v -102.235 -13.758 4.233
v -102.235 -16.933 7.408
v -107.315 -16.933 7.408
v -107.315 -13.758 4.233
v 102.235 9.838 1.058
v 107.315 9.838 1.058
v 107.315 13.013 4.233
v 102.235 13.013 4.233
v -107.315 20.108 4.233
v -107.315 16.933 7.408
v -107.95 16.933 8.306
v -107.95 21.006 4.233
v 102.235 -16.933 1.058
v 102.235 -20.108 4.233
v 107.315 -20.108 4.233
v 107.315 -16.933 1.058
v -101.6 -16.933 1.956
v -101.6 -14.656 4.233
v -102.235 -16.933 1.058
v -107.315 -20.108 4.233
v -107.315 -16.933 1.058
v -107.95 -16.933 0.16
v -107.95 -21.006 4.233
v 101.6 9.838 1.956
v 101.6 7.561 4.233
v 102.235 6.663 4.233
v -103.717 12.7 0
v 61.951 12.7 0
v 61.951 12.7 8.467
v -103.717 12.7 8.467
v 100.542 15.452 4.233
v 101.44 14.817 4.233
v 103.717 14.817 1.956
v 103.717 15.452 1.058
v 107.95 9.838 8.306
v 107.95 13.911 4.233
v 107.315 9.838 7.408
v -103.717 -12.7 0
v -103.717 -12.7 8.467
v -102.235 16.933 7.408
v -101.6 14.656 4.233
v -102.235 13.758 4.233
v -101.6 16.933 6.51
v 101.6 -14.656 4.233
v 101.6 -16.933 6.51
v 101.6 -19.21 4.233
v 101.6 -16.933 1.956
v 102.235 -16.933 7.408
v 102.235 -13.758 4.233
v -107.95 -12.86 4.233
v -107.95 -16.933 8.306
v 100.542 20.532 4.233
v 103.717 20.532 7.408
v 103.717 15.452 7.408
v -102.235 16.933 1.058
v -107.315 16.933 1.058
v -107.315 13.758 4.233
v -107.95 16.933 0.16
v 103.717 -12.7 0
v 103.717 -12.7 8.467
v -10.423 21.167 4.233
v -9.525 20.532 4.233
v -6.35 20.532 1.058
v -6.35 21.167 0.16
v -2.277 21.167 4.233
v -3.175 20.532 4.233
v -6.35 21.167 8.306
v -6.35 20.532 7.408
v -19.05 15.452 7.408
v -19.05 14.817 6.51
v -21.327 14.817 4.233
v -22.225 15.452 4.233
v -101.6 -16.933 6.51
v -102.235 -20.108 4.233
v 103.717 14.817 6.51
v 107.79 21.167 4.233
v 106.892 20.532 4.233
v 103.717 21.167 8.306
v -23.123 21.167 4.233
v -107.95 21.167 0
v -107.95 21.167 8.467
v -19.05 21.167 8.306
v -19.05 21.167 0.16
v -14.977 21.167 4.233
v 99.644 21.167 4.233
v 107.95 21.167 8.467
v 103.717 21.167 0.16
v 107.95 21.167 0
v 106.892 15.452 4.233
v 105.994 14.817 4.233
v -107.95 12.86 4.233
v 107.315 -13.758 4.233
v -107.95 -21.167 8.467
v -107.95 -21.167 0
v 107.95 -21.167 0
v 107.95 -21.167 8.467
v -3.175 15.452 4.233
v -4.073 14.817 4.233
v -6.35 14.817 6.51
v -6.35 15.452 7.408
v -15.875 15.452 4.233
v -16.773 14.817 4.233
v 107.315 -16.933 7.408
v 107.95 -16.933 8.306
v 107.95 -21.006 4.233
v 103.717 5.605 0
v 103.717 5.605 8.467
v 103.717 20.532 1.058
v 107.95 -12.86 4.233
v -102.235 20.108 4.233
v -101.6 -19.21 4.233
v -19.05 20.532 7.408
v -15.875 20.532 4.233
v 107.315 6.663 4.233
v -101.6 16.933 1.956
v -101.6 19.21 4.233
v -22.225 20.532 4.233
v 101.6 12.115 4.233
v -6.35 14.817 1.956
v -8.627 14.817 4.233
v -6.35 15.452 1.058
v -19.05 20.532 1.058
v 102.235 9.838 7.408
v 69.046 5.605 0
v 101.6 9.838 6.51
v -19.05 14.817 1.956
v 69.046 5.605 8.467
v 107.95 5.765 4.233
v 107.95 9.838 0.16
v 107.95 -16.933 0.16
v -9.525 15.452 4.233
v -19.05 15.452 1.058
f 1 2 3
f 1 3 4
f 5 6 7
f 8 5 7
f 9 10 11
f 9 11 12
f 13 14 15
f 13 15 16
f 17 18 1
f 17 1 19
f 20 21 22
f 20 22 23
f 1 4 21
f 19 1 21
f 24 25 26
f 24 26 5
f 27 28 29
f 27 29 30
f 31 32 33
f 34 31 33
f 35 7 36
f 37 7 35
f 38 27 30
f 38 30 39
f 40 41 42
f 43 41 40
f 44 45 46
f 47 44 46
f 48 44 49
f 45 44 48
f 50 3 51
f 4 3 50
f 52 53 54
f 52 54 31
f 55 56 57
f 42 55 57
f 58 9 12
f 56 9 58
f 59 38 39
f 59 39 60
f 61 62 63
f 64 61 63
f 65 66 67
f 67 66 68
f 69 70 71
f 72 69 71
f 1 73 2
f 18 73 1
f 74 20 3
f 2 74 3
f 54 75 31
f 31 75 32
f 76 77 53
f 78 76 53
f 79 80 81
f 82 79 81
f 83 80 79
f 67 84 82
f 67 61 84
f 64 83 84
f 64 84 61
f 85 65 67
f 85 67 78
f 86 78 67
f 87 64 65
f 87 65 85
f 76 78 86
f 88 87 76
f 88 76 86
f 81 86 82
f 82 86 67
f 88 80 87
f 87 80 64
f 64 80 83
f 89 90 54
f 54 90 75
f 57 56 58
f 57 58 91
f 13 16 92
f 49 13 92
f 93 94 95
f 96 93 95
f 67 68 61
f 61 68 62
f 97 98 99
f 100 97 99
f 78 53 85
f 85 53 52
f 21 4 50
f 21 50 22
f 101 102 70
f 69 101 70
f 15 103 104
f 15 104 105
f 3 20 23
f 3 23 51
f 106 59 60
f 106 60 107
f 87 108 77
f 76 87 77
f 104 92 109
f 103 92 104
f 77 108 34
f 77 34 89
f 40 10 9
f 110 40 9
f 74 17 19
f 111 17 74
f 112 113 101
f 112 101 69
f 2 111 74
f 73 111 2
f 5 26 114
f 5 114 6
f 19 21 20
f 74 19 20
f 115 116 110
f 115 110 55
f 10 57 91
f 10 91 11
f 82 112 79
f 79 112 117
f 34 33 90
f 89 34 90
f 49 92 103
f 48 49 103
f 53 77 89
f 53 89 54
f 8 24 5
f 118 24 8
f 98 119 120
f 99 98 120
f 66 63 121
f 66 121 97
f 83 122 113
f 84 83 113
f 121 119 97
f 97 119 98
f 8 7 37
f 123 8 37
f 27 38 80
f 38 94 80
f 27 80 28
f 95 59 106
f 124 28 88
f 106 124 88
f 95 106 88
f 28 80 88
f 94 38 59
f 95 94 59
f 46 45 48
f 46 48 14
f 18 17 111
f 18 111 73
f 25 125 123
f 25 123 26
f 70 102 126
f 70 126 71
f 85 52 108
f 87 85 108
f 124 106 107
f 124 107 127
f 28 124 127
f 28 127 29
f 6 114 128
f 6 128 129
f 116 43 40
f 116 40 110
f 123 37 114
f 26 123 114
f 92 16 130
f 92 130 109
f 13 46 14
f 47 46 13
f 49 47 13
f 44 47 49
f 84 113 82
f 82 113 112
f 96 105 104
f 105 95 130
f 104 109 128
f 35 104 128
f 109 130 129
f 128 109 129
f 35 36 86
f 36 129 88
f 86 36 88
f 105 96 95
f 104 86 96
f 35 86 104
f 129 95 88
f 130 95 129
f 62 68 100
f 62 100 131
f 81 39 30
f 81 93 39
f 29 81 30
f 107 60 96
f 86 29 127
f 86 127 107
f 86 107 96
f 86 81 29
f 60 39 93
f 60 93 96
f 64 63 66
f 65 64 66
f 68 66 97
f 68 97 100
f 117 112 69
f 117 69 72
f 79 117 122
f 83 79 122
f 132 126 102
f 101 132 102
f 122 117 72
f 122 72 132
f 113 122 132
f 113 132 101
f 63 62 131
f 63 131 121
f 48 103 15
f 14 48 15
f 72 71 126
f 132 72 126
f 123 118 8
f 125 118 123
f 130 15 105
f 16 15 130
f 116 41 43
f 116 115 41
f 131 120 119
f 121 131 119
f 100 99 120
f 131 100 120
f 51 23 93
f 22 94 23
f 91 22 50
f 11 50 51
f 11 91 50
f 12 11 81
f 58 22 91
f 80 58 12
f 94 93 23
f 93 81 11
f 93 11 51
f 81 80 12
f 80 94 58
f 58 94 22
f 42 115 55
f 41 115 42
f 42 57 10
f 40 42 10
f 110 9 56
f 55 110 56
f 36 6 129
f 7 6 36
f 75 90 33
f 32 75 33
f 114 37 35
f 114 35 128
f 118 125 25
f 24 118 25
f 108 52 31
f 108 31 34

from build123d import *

# Parameters (mm, degrees)
SKETCH1_W           = 215.9
SKETCH1_H           = 42.333333334
BOSS_EXTRUDE1_DEPTH = 8.466666667
REAR_PIN_DEPTH      = 6.35
FRONT_PIN_DEPTH     = 6.35
TOP_PINS_DEPTH      = 6.35
PIN_CHAMFER_SIZE    = 0.635


with BuildPart() as part:
    # Sketch1 → Boss-Extrude1 (new body)
    with BuildSketch(Plane.XY):
        Rectangle(SKETCH1_W, SKETCH1_H)
        Polygon((-103.716666667, -12.7), (103.716666667, -12.7), (103.716666667, 5.604933333), (69.045666667, 5.604933333), (61.9506, 12.7), (-103.716666667, 12.7), align=None, mode=Mode.SUBTRACT)
    extrude(amount=BOSS_EXTRUDE1_DEPTH)

    # Sketch3 → rear pin (cut)
    with BuildSketch(Plane(origin=(-107.95, 0, 91.206646131), x_dir=(0, 0, -1), z_dir=(1, 0, 0))):
        Polygon((83.798312798, 16.933333333), (86.973312798, 20.108333333), (90.148312798, 16.933333333), (86.973312798, 13.758333333), align=None)
        Polygon((86.973312798, -20.108333333), (83.798312798, -16.933333333), (86.973312798, -13.758333333), (90.148312798, -16.933333333), align=None)
    extrude(amount=REAR_PIN_DEPTH, mode=Mode.SUBTRACT)

    # Sketch4 → front pin (cut)
    with BuildSketch(Plane(origin=(107.95, 0, 0), x_dir=(0, 0, -1), z_dir=(1, 0, 0))):
        Polygon((-1.058333333, 9.838266667), (-4.233333333, 13.013266667), (-7.408333333, 9.838266667), (-4.233333333, 6.663266667), align=None)
        Polygon((-1.058333333, -16.933333333), (-4.233333333, -13.758333333), (-7.408333333, -16.933333333), (-4.233333333, -20.108333333), align=None)
    extrude(amount=-FRONT_PIN_DEPTH, mode=Mode.SUBTRACT)

    # Sketch5 → top pins (cut)
    with BuildSketch(Plane(origin=(0, 21.166666667, 0), x_dir=(1, 0, 0), z_dir=(0, 1, 0))):
        Polygon((106.891666667, -4.233333333), (103.716666667, -7.408333333), (100.541666667, -4.233333333), (103.716666667, -1.058333333), align=None)
        Polygon((-3.175000085, -4.233333333), (-6.350000085, -7.408333333), (-9.525000085, -4.233333333), (-6.350000085, -1.058333333), align=None)
        Polygon((-15.875000085, -4.233333333), (-19.050000085, -7.408333333), (-22.225000085, -4.233333333), (-19.050000085, -1.058333333), align=None)
    extrude(amount=-TOP_PINS_DEPTH, mode=Mode.SUBTRACT)

    # pin chamfer
    pin_chamfer_edges = [part.edges().sort_by_distance(p)[0] for p in [
        (-4.762500085, 14.816666667, 2.645833333),
        (-4.762500085, 14.816666667, 5.820833333),
        (-7.937500085, 14.816666667, 5.820833333),
        (-7.937500085, 14.816666667, 2.645833333),
        (-4.762500085, 21.166666667, 2.645833333),
        (-7.937500085, 21.166666667, 2.645833333),
        (-7.937500085, 21.166666667, 5.820833333),
        (-4.762500085, 21.166666667, 5.820833333),
        (-17.462500085, 14.816666667, 2.645833333),
        (-17.462500085, 14.816666667, 5.820833333),
        (-20.637500085, 14.816666667, 5.820833333),
        (-20.637500085, 14.816666667, 2.645833333),
        (-17.462500085, 21.166666667, 2.645833333),
        (-20.637500085, 21.166666667, 2.645833333),
        (-20.637500085, 21.166666667, 5.820833333),
        (-17.462500085, 21.166666667, 5.820833333),
        (-107.95, 15.345833333, 5.820833333),
        (-107.95, 15.345833333, 2.645833333),
        (-107.95, 18.520833333, 2.645833333),
        (-107.95, 18.520833333, 5.820833333),
        (-101.6, 15.345833333, 5.820833333),
        (-101.6, 15.345833333, 2.645833333),
        (-101.6, 18.520833333, 2.645833333),
        (-101.6, 18.520833333, 5.820833333),
        (-107.95, -18.520833333, 2.645833333),
        (-107.95, -15.345833333, 2.645833333),
        (-107.95, -15.345833333, 5.820833333),
        (-107.95, -18.520833333, 5.820833333),
        (-101.6, -18.520833333, 2.645833333),
        (-101.6, -15.345833333, 2.645833333),
        (-101.6, -15.345833333, 5.820833333),
        (-101.6, -18.520833333, 5.820833333),
        (101.6, 8.250766667, 2.645833333),
        (101.6, 8.250766667, 5.820833333),
        (101.6, 11.425766667, 5.820833333),
        (101.6, 11.425766667, 2.645833333),
        (107.95, 8.250766667, 2.645833333),
        (107.95, 11.425766667, 2.645833333),
        (107.95, 11.425766667, 5.820833333),
        (107.95, 8.250766667, 5.820833333),
        (101.6, -18.520833333, 2.645833333),
        (101.6, -18.520833333, 5.820833333),
        (101.6, -15.345833333, 5.820833333),
        (101.6, -15.345833333, 2.645833333),
        (107.95, -18.520833333, 2.645833333),
        (107.95, -15.345833333, 2.645833333),
        (107.95, -15.345833333, 5.820833333),
        (107.95, -18.520833333, 5.820833333),
        (105.304166667, 14.816666667, 2.645833333),
        (105.304166667, 14.816666667, 5.820833333),
        (102.129166667, 14.816666667, 5.820833333),
        (102.129166667, 14.816666667, 2.645833333),
        (105.304166667, 21.166666667, 2.645833333),
        (102.129166667, 21.166666667, 2.645833333),
        (102.129166667, 21.166666667, 5.820833333),
        (105.304166667, 21.166666667, 5.820833333),
    ]]
    chamfer(pin_chamfer_edges, length=PIN_CHAMFER_SIZE)


solid = part.part
